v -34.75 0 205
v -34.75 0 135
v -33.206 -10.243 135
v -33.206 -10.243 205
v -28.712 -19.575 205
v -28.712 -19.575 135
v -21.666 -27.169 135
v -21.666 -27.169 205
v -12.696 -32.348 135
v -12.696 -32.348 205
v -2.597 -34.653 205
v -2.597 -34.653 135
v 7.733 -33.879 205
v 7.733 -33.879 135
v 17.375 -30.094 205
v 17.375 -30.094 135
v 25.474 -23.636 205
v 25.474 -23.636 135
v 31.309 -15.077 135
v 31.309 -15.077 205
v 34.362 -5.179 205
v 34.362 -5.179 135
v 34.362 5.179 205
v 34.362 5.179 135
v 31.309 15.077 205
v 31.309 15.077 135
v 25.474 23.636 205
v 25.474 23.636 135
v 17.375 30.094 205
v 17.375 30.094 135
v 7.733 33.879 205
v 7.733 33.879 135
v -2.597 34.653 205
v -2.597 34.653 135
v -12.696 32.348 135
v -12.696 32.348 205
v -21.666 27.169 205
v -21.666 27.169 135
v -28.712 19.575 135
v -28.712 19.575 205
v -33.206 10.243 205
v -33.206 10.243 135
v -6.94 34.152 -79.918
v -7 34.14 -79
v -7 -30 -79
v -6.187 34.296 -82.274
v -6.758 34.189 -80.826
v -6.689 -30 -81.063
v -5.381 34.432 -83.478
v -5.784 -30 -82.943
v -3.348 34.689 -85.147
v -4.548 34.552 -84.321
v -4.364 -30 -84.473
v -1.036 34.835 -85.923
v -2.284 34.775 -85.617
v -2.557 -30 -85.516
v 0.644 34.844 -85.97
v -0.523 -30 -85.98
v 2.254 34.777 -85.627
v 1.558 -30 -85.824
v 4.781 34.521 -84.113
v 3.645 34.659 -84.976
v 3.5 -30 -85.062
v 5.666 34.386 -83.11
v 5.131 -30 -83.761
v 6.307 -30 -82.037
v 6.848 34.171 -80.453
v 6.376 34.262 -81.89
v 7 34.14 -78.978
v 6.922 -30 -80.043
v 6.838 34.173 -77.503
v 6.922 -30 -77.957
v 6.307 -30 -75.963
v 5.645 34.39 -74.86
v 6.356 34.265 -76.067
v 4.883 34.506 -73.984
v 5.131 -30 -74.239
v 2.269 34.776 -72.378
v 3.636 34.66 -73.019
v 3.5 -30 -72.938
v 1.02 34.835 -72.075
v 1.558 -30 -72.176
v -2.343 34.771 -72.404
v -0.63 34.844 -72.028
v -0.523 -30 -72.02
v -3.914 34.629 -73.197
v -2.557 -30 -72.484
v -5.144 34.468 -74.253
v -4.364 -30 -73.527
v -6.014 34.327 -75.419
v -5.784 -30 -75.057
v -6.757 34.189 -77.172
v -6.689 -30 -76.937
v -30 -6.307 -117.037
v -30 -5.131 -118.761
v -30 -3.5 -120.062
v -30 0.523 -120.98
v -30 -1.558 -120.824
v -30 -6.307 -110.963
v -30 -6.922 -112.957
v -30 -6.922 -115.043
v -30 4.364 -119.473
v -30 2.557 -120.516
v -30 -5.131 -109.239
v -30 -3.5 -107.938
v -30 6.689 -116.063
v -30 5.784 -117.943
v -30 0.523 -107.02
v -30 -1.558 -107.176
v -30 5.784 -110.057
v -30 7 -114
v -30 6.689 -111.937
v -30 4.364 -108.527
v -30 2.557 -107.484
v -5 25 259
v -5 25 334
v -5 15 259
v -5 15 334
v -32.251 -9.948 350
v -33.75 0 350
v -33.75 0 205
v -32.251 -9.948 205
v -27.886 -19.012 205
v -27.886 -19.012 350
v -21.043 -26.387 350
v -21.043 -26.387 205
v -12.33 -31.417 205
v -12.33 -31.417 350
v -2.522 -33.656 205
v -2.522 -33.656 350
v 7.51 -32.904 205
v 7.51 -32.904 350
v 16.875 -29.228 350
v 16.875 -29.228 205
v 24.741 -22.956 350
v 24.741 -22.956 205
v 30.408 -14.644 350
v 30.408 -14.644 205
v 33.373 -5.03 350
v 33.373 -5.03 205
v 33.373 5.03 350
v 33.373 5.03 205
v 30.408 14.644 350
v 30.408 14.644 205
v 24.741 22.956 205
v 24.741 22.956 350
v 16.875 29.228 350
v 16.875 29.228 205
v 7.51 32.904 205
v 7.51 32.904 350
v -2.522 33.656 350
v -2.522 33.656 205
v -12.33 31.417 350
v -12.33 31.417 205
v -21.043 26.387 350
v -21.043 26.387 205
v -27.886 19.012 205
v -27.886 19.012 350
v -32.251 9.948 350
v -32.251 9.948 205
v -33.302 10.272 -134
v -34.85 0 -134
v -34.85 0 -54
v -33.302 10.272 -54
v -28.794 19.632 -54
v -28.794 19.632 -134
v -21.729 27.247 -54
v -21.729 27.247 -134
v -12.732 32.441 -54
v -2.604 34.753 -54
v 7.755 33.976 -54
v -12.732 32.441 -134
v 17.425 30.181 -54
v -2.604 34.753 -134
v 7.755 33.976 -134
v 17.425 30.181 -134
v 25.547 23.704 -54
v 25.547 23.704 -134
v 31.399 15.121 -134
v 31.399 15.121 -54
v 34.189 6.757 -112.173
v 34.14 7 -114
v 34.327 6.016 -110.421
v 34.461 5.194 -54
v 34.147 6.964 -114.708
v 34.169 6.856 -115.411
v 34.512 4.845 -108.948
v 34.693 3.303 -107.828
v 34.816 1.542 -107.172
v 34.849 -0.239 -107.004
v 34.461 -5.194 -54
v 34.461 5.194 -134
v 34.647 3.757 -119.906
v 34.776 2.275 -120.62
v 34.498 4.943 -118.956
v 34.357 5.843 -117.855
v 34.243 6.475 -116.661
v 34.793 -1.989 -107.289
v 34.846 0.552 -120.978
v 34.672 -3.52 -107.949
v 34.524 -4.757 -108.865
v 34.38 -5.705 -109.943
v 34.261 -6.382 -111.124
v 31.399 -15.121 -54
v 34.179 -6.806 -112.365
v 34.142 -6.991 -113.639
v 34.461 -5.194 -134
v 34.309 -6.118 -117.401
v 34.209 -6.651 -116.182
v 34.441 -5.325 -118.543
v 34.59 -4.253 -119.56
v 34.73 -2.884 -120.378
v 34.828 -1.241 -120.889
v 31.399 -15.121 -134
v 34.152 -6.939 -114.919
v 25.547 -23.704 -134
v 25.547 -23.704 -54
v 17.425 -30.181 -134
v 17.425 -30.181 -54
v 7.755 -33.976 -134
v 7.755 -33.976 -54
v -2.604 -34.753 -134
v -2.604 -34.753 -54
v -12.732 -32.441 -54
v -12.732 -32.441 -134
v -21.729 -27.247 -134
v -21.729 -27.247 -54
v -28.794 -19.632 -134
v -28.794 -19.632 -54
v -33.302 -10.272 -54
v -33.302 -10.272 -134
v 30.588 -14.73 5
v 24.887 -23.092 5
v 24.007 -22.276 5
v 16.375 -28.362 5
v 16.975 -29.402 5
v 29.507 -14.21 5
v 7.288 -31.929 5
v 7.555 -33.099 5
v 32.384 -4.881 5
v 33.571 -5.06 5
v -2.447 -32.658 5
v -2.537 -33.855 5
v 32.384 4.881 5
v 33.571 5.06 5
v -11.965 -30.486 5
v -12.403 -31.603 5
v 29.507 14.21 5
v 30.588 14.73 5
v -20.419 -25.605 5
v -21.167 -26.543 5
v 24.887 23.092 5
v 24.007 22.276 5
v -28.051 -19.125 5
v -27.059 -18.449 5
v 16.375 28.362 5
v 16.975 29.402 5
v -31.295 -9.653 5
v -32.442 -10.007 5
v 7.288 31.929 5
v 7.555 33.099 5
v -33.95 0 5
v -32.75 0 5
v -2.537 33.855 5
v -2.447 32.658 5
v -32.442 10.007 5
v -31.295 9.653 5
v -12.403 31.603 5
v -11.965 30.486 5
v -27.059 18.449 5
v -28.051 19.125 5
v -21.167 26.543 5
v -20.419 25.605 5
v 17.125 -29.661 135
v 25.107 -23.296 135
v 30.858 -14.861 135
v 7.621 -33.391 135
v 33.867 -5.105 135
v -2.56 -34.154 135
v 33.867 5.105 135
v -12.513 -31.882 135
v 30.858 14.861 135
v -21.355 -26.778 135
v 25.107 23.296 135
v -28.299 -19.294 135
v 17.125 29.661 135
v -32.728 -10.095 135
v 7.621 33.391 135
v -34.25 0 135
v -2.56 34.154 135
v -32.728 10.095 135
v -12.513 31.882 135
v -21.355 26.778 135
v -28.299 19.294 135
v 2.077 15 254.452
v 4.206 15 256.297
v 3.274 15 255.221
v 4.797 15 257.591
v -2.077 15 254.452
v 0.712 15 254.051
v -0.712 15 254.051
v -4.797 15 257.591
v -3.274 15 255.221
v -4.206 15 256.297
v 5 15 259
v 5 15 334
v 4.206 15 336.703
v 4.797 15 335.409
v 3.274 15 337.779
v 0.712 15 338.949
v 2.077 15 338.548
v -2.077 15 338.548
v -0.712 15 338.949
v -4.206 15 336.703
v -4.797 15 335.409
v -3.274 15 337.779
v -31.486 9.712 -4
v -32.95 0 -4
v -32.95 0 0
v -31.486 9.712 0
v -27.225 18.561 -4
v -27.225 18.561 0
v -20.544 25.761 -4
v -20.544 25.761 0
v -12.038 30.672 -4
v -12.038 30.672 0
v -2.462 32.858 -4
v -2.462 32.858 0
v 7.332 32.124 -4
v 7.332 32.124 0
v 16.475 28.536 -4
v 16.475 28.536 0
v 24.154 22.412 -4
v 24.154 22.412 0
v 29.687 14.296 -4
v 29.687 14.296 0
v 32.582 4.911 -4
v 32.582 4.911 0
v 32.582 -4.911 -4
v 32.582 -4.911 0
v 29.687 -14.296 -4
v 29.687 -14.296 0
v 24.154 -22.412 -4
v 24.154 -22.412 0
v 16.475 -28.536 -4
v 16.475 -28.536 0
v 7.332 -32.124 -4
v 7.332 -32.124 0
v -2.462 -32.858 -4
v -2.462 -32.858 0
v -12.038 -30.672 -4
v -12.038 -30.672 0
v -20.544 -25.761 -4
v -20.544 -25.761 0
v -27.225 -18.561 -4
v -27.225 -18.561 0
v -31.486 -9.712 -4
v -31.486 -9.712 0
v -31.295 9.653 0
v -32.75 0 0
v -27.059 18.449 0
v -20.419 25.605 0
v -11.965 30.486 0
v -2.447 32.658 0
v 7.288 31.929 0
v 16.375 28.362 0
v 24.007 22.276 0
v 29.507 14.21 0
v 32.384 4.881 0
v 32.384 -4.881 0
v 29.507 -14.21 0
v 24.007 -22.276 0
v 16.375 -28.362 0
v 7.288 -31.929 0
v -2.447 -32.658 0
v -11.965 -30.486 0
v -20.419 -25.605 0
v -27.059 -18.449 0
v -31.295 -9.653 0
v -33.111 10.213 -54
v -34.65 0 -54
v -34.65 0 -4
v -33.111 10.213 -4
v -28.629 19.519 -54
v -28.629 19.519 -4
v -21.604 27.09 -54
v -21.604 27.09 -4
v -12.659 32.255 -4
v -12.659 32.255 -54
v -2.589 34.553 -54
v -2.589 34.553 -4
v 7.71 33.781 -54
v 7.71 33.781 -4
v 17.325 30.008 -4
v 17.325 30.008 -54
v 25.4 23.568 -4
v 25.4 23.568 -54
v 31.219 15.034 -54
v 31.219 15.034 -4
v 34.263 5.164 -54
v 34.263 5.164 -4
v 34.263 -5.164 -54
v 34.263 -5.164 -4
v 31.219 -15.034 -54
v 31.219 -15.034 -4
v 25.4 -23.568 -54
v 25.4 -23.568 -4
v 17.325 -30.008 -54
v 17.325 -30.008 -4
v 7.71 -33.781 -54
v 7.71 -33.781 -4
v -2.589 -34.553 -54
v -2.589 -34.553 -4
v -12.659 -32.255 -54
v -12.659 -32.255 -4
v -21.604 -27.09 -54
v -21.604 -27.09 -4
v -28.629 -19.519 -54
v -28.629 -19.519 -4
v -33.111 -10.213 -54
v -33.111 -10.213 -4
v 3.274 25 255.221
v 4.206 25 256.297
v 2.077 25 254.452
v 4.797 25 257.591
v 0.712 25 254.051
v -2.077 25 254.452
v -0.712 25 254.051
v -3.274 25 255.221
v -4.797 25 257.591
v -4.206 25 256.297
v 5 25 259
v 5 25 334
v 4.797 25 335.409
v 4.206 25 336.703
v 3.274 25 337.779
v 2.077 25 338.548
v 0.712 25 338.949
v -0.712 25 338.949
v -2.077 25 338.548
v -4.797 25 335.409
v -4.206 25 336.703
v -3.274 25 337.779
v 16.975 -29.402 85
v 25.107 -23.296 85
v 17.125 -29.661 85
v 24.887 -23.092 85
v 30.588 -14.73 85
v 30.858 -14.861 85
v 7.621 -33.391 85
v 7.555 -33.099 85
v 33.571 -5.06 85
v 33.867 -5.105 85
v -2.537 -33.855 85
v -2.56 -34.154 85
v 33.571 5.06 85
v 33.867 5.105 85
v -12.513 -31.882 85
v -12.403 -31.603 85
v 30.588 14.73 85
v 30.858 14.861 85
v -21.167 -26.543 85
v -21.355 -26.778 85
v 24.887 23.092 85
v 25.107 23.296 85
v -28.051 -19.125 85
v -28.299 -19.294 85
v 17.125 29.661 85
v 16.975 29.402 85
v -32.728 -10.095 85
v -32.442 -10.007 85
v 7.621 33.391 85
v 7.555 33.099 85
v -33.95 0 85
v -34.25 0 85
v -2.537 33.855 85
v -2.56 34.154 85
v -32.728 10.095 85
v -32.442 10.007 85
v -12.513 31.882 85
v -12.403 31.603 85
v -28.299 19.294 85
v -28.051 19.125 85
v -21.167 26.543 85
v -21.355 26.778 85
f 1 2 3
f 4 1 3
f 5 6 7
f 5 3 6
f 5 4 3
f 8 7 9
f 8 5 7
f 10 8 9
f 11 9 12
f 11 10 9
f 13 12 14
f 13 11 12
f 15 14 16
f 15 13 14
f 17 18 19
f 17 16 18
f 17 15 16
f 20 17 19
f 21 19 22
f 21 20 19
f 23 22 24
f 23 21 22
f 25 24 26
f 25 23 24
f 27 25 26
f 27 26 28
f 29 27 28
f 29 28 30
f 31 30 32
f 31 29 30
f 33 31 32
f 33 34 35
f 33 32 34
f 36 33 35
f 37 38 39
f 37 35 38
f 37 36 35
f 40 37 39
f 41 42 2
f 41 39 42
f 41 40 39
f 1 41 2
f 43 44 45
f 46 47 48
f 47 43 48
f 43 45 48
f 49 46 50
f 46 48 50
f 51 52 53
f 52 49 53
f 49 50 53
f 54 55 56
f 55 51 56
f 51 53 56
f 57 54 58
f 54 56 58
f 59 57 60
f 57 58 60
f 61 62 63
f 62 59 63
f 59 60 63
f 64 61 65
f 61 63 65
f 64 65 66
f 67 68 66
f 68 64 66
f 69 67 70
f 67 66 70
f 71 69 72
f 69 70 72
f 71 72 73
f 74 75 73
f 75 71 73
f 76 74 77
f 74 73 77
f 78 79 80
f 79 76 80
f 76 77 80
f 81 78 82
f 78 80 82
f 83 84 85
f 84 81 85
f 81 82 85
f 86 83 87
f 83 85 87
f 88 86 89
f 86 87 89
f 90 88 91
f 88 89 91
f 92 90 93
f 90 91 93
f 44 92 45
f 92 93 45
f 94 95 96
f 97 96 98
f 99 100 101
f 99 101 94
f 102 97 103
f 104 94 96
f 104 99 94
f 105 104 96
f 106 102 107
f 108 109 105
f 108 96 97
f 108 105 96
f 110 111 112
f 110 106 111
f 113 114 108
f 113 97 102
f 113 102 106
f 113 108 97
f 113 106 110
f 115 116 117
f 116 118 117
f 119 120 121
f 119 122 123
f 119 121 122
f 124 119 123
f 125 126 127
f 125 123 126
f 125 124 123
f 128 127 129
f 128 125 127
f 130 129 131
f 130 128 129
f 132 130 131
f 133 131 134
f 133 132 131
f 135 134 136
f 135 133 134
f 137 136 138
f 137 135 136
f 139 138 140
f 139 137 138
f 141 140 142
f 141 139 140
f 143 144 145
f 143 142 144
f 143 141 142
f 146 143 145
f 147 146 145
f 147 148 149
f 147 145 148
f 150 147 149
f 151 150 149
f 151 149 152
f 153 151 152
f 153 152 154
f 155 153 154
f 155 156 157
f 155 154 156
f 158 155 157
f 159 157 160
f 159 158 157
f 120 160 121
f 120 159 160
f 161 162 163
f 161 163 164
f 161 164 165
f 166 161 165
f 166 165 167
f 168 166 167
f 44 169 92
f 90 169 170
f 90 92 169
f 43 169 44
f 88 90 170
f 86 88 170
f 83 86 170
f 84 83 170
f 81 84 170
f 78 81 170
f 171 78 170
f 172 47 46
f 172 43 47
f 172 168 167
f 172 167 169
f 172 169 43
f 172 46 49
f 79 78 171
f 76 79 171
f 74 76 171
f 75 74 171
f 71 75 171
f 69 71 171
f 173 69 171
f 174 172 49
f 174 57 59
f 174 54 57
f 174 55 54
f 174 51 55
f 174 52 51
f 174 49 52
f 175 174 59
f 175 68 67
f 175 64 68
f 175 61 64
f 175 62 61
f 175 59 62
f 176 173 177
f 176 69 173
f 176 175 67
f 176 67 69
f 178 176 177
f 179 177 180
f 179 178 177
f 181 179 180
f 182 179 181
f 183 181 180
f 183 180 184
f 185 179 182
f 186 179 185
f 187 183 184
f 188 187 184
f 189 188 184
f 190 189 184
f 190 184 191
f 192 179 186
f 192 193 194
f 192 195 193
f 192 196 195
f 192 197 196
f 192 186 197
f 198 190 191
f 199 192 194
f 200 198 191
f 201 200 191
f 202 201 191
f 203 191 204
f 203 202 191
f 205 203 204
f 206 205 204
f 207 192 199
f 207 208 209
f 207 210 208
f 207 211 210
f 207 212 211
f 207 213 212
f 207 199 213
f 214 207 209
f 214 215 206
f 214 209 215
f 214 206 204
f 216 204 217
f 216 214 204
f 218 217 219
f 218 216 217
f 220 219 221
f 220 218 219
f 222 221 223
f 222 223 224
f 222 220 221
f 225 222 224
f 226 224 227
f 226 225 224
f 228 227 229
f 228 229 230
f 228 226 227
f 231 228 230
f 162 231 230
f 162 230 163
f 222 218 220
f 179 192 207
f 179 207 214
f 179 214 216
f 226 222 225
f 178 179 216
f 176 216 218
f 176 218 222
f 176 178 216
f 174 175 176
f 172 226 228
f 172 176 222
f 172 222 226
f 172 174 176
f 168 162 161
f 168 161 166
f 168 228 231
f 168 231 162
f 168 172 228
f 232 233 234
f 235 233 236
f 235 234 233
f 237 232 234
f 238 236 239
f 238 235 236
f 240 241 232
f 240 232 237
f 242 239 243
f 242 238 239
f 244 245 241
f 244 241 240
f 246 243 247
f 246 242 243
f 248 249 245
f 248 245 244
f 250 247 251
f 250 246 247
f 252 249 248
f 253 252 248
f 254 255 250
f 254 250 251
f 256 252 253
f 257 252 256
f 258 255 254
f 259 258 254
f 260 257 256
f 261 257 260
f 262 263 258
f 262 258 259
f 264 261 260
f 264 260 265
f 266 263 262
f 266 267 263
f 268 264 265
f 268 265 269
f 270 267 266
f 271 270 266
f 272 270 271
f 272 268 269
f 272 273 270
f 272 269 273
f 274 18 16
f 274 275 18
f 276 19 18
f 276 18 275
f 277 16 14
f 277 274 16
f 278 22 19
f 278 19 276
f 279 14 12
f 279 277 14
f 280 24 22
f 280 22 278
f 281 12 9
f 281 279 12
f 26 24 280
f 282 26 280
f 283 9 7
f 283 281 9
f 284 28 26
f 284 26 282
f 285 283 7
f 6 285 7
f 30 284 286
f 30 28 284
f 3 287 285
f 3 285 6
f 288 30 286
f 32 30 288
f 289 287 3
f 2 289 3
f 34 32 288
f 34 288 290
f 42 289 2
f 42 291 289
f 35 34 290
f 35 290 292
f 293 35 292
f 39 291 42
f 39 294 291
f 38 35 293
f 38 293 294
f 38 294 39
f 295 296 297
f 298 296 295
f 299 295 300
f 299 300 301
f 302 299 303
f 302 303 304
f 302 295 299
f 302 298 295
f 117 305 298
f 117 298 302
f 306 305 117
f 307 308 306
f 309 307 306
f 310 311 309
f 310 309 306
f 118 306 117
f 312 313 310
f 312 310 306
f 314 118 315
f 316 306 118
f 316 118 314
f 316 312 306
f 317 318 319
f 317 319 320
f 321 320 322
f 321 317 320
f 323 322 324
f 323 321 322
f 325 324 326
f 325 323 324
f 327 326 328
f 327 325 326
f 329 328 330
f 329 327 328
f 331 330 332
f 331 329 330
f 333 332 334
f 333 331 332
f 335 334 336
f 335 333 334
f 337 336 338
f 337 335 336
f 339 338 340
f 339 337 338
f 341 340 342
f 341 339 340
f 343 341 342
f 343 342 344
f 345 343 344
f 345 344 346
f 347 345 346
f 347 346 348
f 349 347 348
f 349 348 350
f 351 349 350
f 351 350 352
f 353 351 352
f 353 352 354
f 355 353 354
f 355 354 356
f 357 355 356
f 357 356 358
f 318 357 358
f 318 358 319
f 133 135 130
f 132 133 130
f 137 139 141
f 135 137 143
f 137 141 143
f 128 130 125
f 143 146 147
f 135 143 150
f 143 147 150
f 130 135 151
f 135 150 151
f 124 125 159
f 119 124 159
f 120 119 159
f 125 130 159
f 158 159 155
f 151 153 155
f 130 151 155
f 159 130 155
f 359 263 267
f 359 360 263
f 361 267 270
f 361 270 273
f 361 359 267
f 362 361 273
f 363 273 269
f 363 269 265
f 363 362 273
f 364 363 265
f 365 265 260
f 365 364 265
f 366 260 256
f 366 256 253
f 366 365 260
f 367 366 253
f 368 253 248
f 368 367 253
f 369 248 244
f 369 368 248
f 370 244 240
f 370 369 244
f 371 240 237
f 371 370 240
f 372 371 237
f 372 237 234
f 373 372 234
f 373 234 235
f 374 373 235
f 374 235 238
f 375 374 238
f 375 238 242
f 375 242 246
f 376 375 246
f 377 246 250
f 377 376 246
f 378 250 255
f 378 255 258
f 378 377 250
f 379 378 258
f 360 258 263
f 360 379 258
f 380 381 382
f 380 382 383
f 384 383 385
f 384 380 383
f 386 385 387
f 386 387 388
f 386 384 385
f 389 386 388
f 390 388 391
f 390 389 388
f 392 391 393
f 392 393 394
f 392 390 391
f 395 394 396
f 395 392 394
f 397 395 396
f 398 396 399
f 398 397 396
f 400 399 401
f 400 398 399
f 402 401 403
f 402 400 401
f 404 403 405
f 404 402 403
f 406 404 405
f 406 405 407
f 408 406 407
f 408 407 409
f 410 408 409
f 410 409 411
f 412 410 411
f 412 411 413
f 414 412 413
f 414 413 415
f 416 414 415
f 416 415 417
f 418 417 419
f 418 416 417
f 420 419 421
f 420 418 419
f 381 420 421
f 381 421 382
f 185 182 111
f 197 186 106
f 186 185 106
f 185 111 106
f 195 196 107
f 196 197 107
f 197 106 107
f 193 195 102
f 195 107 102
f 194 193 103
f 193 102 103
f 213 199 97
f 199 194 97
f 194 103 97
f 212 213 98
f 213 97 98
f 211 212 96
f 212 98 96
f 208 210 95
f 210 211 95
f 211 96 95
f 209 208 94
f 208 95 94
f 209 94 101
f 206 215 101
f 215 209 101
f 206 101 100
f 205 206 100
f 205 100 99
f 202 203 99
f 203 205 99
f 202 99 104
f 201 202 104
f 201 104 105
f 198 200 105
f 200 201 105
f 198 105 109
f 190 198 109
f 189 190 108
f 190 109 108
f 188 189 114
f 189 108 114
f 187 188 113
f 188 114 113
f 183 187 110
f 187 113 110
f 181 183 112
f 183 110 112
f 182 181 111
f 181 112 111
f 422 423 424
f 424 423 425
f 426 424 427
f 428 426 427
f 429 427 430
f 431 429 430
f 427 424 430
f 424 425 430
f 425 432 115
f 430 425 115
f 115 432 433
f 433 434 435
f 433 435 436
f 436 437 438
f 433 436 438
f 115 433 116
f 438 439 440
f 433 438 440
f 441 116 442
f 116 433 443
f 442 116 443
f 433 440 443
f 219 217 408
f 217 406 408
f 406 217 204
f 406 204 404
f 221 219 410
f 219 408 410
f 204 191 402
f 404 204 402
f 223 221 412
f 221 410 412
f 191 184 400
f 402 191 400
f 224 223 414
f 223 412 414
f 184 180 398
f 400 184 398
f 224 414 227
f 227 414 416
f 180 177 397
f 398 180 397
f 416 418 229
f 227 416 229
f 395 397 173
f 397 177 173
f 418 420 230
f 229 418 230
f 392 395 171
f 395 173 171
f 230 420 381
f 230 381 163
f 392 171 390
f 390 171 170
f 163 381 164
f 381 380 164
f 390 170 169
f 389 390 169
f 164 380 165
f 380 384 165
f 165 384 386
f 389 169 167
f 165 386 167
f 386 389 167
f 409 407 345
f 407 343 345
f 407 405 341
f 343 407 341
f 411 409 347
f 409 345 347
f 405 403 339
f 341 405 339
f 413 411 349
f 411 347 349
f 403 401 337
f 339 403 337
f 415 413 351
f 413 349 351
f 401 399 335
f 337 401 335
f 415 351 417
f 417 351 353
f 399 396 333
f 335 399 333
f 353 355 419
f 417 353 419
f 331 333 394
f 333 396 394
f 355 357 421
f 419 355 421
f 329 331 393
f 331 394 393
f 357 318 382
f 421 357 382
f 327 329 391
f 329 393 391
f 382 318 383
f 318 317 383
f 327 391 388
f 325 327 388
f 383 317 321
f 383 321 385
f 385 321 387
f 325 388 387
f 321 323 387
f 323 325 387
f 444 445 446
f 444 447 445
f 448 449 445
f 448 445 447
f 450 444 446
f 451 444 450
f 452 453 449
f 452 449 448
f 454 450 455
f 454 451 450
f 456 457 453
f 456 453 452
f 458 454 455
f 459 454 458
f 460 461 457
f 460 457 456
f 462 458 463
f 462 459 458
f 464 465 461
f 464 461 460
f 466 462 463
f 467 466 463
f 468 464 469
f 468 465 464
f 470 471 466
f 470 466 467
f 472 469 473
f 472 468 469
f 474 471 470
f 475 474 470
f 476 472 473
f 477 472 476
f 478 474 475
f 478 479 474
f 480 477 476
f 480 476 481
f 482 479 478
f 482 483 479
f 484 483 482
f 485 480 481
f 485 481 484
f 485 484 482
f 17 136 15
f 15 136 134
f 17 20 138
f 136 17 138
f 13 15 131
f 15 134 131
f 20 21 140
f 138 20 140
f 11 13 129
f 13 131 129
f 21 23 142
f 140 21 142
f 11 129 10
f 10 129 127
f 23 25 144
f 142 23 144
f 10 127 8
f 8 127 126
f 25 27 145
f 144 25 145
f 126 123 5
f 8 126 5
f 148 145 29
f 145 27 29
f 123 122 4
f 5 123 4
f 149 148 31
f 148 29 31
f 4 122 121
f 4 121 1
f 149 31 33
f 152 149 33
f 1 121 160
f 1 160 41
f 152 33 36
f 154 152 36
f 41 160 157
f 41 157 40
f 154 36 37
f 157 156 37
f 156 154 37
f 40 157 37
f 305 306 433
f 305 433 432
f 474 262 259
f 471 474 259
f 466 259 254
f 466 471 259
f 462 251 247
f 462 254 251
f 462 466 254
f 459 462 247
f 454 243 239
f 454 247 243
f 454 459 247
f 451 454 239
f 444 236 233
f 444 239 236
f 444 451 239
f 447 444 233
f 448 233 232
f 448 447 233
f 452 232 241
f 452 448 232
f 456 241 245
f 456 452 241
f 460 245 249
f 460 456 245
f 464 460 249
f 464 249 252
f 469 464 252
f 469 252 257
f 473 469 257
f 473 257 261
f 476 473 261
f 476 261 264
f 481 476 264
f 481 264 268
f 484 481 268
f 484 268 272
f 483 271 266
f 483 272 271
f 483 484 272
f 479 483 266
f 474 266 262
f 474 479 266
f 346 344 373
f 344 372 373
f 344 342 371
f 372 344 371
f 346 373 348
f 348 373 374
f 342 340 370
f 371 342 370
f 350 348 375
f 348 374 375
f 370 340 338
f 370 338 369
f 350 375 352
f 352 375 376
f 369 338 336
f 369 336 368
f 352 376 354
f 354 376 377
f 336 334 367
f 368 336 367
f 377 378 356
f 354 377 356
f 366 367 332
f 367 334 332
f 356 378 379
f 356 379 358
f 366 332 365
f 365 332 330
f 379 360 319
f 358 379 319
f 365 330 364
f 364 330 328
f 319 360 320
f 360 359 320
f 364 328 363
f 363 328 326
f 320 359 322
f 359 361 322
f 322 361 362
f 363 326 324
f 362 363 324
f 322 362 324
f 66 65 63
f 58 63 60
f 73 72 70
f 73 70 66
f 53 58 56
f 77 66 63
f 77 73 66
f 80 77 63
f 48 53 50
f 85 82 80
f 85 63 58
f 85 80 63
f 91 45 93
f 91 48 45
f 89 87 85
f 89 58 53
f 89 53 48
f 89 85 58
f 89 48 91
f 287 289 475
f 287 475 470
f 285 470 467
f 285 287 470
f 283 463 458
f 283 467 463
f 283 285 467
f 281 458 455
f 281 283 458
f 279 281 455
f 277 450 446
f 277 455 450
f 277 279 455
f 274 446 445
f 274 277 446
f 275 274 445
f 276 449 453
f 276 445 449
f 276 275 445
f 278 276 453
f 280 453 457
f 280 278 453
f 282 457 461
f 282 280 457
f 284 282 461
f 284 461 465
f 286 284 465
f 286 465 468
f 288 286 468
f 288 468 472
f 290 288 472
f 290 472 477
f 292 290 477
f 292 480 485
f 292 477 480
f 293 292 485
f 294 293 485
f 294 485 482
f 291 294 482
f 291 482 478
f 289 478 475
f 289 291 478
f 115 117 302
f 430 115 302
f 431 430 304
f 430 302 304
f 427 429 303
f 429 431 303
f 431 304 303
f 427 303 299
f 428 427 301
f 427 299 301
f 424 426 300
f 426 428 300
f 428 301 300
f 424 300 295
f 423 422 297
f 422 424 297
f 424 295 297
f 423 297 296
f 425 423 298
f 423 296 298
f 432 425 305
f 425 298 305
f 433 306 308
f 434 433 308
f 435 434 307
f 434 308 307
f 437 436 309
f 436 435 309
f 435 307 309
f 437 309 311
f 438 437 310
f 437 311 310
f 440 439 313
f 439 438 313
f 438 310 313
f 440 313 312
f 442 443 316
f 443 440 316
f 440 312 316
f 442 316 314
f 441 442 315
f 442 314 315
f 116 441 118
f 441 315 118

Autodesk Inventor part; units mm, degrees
ref_plane "YZ Plane" through (0, 0, 0) normal (1, 0, 0) x (0, 1, 0)
ref_plane "XY Plane" through (0, 0, 0) normal (0, 0, 1) x (1, 0, 0)
sketch "Sketch1" plane through (0, 0, 0) normal (0, 1, 0) x (-1, 0, 0)
  line L0 (32.75, 5) -> (33.95, 5)
  line L1 (33.95, 5) -> (33.95, 85)
  line L2 (33.95, 85) -> (34.25, 85)
  line L3 (34.25, 85) -> (34.25, 135)
  line L4 (34.25, 135) -> (34.75, 135)
  line L5 (34.75, 135) -> (34.75, 205)
  line L6 (34.75, 205) -> (33.75, 205)
  line L7 (33.75, 205) -> (33.75, 245)
  line L8 (33.75, 245) -> (33.75, 245)
  line L9 (33.75, 245) -> (33.75, 350)
  line L10 (33.75, 350) -> (0, 350)
  line L11 (0, 189.8856) -> (0, -122.7414) construction
  line L12 (32.75, 5) -> (32.75, 0)
  line L13 (0, 350) -> (0, 0)
  line L14 (32.75, 0) -> (32.95, 0)
  line L15 (32.95, 0) -> (32.95, -4)
  line L16 (32.95, -4) -> (34.65, -4)
  line L17 (34.65, -4) -> (34.65, -54)
  line L18 (34.65, -54) -> (34.85, -54)
  line L19 (34.85, -54) -> (34.85, -134)
  line L20 (34.85, -134) -> (0, -134)
  line L21 (0, 0) -> (0, -134)
  line L22 (32.75, 0) -> (32.95, 0)
  dimension "d0" = 105
  dimension "d3" = 70
  dimension "d2" = 80
  dimension "d4" = 5
  dimension "d15" = 40
  dimension "d16" = 50
  dimension "d69" = 33.75
  dimension "d70" = 34.75
  dimension "d71" = 33.95
  dimension "d78" = 32.75
  dimension "d82" = 4
  dimension "d83" = 50
  dimension "d84" = 32.95
  dimension "d85" = 34.85
  dimension "d86" = 80
  dimension "d87" = 33.75
  dimension "d88" = 34.25
  dimension "d89" = 34.65
ref_plane "Work Plane1" through (0, 15, 0) normal (0, 1, 0) x (-1, 0, 0)
sketch "Sketch2" plane through (0, 15, 0) normal (0, 1, 0) x (-1, 0, 0)
  arc A0 (-5, 259) -> (5, 259) centre (0, 259) ccw
  arc A1 (5, 334) -> (-5, 334) centre (0, 334) ccw
  line L0 (-5, 334) -> (-5, 259)
  line L1 (5, 334) -> (5, 259)
  line L2 (0, 0) -> (0, 401.4271) construction
  dimension "d18" = 10
  dimension "d19" = 10
  dimension "d65" = 259
  dimension "d68" = 75
sketch "Sketch3" plane through (0, 15, 0) normal (0, 1, 0) x (-1, 0, 0)
  circle A0 centre (0, -79) radius 7
  point P0 (0, 0)
  dimension "d22" = 14
  dimension "d66" = 79
sketch "Sketch4" plane through (0, 0, 0) normal (1, 0, 0) x (0, 1, 0)
  circle A0 centre (0, -114) radius 7
  point P0 (0, 0)
  dimension "d28" = 14
  dimension "d67" = 114
revolve "Revolution1" add sketch "Sketch1" angle 360 about axis through (0, 0, 350) along (0, 0, -1)
extrude "Extrusion4" cut sketch "Sketch2" along normal blind 10
extrude "Extrusion5" cut sketch "Sketch3" along normal blind 20 and the other way blind 45
extrude "Extrusion6" cut sketch "Sketch4" along normal blind 35 and the other way blind 30
sketch "Sketch5" plane through (0, 0, 0) normal (0, 1, 0) x (-1, 0, 0)
  line L0 (32.75, 5) -> (32.75, 0) projected
  point P0 (0, 0)
sketch "Sketch6" plane through (0, 0, 0) normal (1, 0, 0) x (0, 1, 0)
  line L0 (0, 0) -> (-46.2751, 0) construction
equation "\"espesor_testero\" = 4"
equation "\"espesor_brida\" = 5"
properties part number "Mangon_Conduccion"
